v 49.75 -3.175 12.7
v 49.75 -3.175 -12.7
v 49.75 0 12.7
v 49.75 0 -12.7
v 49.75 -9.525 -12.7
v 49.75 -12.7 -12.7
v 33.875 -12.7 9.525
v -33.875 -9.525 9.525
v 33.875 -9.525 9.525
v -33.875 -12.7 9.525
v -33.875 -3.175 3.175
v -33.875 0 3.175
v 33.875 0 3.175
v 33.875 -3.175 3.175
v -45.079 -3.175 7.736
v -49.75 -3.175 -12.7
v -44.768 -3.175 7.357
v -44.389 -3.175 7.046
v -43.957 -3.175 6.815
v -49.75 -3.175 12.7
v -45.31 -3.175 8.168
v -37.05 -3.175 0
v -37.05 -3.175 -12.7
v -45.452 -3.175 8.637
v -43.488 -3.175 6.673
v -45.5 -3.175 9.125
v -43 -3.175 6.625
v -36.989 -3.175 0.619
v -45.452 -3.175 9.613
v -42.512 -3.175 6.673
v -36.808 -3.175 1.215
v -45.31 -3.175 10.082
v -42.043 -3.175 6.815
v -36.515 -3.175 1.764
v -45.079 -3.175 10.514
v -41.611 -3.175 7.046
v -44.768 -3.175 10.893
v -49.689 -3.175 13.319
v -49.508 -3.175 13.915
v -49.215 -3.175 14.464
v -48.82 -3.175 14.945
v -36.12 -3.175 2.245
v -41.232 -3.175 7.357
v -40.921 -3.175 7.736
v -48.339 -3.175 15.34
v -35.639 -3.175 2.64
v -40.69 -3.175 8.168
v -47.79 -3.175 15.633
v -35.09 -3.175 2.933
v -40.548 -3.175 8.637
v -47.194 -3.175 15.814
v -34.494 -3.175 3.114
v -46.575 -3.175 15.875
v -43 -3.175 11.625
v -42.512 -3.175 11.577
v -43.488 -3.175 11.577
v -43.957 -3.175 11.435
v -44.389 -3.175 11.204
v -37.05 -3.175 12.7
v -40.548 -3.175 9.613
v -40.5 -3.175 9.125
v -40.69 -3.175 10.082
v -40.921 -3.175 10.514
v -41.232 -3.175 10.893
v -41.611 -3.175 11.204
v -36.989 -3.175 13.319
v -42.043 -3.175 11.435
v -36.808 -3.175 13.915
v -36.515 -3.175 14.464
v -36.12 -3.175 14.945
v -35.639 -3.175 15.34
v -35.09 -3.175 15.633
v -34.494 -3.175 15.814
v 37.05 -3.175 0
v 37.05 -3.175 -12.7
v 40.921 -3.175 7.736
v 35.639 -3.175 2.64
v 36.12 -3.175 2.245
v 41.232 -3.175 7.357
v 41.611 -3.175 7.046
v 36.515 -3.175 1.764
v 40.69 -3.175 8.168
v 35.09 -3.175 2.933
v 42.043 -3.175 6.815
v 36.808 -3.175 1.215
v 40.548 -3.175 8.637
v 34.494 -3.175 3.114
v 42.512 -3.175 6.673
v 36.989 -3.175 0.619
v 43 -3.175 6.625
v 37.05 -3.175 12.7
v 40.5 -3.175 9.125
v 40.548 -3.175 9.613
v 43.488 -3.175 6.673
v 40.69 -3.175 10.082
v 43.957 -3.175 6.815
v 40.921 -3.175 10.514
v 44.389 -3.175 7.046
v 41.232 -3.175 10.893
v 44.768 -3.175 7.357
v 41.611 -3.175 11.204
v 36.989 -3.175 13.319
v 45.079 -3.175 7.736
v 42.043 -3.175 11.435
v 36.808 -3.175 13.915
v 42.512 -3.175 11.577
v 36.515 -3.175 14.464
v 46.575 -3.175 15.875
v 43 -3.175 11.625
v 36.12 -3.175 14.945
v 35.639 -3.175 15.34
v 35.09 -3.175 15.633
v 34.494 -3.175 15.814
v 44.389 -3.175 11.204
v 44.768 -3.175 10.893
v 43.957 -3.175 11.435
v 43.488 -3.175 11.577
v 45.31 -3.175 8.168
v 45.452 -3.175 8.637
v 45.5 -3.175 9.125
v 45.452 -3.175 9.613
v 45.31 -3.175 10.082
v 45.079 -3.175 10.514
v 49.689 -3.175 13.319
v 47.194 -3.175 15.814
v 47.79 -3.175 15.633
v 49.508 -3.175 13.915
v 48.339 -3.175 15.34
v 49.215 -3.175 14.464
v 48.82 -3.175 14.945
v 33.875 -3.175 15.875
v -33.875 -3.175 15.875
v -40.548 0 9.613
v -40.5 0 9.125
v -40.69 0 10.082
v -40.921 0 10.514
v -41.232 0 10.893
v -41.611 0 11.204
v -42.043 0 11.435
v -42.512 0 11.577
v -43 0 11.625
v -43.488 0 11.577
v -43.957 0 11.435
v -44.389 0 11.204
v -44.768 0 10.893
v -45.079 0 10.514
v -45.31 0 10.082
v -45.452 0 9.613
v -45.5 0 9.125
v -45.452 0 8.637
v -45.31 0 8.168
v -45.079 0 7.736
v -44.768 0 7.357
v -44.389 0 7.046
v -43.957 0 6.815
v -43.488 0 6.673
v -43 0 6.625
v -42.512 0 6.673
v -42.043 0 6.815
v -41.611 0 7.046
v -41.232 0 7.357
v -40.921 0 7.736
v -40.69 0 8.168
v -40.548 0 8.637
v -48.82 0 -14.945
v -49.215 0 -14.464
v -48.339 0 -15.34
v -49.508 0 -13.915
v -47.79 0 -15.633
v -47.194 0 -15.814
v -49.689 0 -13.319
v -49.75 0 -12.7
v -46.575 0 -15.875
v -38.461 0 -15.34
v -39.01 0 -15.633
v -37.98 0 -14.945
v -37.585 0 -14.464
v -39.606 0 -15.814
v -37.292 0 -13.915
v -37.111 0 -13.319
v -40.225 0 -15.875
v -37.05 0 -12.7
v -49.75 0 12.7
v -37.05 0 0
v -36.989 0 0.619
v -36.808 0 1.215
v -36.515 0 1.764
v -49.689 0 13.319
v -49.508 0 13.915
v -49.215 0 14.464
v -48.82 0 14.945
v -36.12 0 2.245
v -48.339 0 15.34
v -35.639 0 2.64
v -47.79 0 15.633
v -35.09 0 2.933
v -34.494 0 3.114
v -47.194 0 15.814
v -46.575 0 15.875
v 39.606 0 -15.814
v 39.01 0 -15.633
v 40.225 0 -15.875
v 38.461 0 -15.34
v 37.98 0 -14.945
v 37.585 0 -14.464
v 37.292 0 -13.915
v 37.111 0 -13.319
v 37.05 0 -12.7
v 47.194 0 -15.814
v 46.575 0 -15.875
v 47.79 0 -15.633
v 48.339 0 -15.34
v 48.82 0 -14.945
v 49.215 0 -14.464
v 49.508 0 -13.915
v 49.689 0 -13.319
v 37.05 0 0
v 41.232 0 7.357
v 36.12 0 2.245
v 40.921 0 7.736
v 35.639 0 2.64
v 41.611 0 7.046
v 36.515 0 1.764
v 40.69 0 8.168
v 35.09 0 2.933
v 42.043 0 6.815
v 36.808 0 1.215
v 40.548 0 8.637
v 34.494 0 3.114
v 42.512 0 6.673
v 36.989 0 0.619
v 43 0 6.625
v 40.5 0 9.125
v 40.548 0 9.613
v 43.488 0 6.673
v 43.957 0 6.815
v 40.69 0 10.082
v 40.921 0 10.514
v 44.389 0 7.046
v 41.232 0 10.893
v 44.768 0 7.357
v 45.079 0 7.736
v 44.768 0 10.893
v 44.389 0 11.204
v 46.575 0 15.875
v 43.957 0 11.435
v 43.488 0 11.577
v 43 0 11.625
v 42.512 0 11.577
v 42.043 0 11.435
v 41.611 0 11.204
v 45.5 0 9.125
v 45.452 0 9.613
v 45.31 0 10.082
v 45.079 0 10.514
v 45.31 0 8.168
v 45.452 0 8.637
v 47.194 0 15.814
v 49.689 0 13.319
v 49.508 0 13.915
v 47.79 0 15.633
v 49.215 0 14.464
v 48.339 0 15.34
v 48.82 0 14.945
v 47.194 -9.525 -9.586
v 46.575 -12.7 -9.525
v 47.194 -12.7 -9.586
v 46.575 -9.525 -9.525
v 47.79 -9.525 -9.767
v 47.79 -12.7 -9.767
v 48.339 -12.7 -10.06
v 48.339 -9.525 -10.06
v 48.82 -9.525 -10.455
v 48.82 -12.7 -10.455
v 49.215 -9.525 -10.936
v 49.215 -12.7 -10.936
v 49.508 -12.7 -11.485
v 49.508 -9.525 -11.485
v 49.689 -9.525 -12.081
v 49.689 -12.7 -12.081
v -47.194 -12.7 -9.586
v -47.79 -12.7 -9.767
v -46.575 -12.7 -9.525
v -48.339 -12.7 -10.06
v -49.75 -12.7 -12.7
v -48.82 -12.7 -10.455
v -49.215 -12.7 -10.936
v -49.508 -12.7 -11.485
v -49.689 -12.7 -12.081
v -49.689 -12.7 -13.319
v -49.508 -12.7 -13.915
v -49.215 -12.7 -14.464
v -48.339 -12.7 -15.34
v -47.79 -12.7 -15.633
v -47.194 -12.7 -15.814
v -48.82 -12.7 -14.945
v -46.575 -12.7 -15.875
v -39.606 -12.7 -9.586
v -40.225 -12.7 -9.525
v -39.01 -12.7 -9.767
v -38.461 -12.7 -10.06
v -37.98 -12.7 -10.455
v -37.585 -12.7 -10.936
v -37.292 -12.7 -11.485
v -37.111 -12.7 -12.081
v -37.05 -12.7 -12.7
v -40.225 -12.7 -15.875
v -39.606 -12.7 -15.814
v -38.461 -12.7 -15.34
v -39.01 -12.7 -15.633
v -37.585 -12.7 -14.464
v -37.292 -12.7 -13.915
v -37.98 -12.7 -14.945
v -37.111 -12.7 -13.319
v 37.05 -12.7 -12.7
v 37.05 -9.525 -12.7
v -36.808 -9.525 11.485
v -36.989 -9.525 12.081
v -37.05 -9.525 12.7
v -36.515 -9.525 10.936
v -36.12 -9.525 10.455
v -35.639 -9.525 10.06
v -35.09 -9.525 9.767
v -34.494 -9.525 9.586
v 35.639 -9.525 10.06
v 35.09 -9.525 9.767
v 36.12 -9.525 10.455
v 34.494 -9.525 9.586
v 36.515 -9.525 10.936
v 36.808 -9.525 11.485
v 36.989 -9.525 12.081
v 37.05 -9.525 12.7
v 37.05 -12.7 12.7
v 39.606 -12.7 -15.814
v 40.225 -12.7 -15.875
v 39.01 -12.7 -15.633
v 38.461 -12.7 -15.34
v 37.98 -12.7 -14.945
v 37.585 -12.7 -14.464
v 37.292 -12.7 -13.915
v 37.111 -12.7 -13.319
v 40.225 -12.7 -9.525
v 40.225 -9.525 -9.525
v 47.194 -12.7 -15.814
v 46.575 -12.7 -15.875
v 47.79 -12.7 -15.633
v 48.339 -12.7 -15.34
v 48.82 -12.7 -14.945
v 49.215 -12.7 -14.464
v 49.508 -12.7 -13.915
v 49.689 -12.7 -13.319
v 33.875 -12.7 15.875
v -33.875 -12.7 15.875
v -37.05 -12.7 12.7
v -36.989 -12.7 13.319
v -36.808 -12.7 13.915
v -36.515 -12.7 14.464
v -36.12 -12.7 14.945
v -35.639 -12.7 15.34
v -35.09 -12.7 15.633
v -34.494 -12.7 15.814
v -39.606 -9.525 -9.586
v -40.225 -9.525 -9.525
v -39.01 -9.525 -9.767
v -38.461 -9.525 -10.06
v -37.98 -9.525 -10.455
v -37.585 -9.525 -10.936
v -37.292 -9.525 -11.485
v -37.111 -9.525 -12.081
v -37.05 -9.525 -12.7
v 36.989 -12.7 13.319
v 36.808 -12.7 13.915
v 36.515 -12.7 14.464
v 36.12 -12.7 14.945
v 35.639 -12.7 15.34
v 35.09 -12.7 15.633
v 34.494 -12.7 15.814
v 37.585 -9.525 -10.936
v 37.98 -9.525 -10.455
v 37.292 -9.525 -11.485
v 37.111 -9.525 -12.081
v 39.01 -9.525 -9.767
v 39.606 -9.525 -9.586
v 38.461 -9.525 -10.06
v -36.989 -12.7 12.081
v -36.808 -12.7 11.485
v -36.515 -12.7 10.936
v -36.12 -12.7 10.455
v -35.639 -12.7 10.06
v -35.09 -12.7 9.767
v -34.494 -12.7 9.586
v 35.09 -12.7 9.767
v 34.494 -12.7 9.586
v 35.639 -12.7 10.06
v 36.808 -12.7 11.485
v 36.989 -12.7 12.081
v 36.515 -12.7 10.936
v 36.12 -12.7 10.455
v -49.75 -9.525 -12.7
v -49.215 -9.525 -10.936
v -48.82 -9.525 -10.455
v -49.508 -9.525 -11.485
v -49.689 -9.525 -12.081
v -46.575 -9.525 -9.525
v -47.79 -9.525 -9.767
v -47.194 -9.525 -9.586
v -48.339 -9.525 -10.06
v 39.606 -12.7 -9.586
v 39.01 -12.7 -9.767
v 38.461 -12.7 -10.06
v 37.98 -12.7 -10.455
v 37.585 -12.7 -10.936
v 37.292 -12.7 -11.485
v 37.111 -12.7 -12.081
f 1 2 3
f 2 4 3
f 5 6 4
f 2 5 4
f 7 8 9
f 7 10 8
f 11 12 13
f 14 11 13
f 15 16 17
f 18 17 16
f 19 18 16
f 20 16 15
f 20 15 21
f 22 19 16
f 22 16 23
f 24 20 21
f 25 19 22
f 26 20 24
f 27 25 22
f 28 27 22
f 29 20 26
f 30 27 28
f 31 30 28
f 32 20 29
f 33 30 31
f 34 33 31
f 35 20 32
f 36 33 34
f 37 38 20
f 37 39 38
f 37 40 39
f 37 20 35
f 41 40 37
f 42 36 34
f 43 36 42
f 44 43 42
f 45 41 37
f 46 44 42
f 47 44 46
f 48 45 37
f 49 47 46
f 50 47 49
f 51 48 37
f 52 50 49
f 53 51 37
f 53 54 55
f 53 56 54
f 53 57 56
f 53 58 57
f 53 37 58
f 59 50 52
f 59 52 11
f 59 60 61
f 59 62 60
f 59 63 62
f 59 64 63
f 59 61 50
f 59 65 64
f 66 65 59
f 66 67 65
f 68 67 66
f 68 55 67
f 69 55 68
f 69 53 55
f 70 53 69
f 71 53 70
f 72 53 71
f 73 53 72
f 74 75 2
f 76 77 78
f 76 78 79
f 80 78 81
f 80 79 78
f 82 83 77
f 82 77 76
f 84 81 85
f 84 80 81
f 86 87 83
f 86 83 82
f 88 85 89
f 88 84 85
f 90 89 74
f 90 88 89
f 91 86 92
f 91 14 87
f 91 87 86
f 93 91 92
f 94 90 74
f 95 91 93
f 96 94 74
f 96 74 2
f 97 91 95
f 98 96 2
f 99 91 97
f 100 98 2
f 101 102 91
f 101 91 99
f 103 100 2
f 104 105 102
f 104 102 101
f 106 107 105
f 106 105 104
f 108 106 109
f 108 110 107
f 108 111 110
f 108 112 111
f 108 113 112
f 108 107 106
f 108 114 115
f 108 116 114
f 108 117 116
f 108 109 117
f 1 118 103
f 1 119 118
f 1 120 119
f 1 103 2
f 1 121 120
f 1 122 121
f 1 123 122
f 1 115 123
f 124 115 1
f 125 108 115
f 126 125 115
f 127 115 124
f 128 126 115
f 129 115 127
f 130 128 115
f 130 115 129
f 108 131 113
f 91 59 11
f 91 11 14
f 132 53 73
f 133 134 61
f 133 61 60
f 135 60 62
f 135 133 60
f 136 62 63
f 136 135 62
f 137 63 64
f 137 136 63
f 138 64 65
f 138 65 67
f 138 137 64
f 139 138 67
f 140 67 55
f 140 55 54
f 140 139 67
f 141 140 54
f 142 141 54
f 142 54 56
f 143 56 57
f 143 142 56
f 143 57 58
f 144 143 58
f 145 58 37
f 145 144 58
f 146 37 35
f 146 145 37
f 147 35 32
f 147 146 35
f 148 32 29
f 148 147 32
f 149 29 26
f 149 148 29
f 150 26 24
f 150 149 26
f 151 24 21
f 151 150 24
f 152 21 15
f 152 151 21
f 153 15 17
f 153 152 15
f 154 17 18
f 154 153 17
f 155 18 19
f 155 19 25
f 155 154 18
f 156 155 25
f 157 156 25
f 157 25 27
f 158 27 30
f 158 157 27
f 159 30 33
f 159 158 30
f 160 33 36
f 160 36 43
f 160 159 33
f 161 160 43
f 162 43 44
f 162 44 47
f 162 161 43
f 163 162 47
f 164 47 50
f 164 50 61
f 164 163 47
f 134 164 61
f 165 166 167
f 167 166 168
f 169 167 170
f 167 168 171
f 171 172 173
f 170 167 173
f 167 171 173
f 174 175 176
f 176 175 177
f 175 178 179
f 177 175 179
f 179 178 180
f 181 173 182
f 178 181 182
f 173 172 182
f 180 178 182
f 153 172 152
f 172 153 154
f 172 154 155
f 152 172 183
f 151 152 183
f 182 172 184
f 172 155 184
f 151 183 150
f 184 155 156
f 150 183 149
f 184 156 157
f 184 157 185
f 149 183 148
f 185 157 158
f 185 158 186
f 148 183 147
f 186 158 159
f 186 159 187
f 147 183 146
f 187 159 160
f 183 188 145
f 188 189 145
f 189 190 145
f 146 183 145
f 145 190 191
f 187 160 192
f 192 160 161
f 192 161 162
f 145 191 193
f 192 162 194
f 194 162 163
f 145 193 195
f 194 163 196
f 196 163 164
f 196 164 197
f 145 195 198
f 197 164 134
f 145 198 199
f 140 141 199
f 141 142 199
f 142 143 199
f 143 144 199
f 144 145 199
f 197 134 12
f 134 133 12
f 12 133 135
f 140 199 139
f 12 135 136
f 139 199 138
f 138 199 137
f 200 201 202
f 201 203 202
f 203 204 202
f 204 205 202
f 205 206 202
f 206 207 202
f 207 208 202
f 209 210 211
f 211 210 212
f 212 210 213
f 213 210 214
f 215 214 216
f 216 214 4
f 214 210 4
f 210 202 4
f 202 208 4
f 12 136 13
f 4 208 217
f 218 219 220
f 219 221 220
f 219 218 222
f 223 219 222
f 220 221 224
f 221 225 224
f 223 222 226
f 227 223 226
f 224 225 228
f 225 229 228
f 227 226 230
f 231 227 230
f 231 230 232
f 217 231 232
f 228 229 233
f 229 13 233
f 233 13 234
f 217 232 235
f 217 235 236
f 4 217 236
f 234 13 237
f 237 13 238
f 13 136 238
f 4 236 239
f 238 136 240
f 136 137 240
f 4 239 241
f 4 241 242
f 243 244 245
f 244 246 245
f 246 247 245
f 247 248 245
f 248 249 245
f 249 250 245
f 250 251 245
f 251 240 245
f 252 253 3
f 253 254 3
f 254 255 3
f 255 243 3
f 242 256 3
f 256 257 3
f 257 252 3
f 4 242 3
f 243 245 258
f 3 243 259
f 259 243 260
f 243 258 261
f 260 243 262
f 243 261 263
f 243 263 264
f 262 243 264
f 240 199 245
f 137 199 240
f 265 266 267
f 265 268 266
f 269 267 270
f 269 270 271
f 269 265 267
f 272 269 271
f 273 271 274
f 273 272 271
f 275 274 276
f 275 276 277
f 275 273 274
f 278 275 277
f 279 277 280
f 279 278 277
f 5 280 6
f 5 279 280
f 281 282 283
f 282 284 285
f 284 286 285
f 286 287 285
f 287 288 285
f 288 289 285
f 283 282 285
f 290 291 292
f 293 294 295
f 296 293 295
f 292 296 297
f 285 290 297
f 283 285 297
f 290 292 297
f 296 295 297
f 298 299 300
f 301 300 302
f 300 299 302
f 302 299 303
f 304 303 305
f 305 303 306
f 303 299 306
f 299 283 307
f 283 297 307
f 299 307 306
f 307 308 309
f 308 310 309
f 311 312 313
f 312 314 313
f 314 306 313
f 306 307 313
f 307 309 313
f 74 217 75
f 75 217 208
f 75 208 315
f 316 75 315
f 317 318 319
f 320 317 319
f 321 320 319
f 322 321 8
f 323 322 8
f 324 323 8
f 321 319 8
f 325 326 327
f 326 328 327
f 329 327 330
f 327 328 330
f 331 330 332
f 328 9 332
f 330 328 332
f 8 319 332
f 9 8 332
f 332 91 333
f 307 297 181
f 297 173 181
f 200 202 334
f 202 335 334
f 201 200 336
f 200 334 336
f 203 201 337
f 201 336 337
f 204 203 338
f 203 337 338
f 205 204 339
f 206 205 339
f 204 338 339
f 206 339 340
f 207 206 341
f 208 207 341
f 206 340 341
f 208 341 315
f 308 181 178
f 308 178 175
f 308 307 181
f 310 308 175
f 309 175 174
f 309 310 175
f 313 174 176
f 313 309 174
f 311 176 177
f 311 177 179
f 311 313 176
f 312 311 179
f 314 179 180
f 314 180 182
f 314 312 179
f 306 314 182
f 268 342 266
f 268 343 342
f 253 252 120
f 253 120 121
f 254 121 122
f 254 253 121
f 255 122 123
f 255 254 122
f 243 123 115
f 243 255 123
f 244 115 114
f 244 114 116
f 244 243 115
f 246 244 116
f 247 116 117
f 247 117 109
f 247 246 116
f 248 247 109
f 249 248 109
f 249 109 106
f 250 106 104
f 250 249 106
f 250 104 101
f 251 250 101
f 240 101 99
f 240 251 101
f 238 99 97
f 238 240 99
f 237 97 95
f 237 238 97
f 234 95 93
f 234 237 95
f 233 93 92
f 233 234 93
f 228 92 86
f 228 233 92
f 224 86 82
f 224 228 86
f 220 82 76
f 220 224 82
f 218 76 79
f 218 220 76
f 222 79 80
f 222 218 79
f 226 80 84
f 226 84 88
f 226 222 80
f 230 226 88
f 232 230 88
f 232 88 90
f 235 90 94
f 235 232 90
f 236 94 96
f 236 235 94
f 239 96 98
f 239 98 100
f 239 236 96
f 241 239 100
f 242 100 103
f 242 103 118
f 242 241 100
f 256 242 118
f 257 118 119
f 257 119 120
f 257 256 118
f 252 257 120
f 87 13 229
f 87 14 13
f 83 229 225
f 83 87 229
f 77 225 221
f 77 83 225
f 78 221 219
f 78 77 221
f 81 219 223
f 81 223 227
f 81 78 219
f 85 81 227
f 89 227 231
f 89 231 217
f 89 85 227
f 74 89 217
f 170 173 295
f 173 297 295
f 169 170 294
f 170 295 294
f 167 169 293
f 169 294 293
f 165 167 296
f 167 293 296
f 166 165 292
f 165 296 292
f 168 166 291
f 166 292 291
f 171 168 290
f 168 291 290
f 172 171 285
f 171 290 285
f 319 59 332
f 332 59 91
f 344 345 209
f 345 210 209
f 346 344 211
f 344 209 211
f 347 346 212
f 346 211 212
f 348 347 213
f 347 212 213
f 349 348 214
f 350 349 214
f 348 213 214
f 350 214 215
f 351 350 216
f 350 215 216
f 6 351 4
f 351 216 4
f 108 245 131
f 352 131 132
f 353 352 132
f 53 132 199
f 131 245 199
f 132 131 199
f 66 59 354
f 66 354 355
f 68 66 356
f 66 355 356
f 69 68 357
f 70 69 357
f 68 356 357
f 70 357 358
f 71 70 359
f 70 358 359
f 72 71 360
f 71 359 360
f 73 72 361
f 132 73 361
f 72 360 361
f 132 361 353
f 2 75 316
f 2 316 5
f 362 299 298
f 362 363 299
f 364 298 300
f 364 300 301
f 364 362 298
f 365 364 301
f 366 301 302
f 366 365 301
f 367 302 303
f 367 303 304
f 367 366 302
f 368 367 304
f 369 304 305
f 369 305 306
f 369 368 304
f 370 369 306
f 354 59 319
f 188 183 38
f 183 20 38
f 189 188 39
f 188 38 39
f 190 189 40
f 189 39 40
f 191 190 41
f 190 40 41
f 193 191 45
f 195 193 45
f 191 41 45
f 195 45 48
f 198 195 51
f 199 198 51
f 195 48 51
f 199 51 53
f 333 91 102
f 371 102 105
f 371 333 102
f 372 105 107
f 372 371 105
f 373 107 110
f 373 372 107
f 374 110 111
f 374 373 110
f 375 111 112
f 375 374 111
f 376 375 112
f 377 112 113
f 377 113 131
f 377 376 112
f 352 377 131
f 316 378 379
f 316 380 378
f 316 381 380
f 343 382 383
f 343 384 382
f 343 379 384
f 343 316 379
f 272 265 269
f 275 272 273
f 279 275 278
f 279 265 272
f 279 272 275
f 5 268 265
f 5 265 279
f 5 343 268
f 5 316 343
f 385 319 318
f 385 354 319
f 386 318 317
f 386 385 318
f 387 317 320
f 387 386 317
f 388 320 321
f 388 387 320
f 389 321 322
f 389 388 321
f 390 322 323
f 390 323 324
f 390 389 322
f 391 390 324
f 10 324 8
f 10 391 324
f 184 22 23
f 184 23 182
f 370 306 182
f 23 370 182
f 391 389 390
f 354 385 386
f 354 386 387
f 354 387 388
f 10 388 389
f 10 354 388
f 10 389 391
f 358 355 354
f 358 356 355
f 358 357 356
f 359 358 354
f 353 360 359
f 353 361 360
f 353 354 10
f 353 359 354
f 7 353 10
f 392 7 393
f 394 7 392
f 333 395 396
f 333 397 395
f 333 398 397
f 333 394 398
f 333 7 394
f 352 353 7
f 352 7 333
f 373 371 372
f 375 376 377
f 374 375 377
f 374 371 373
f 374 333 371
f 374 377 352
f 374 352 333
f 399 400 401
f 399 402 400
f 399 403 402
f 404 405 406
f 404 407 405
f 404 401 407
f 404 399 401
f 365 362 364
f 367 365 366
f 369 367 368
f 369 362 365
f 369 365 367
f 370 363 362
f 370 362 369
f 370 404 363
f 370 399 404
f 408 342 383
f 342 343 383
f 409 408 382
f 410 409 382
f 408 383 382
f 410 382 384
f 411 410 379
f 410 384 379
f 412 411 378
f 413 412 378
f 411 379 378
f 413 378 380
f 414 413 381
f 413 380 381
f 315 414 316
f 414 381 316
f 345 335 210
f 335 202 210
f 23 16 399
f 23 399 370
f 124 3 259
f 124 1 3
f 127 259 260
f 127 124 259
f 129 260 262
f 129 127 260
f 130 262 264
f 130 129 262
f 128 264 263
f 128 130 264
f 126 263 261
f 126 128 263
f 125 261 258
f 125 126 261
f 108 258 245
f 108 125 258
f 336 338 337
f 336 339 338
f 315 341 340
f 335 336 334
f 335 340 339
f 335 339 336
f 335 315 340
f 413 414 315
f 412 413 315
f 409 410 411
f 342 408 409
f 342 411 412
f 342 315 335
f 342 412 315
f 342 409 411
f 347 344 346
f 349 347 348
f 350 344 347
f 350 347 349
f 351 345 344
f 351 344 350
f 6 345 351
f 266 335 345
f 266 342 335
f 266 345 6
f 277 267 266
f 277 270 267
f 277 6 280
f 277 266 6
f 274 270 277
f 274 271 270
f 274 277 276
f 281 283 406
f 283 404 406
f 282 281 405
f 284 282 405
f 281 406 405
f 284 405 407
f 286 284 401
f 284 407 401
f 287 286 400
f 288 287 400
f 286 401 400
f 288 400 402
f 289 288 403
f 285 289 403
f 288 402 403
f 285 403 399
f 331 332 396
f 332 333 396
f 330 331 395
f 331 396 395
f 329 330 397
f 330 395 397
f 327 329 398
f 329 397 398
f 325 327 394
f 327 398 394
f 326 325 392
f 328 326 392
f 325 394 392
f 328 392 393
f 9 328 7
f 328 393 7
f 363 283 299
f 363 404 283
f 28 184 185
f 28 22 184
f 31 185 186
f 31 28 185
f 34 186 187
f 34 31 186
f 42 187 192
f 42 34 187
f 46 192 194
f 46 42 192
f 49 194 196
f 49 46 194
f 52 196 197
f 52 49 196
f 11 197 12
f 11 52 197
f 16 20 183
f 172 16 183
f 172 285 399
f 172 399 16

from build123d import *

# Parameters (mm, degrees)
F0_R     = 2.5
F1_DEPTH = 3.175
F2_W     = 12.7
F2_H     = 3.175
F2_W_2   = 74.1
F3_DEPTH = 9.525
F4_W     = 12.7
F4_H     = 3.175
F5_DEPTH = 3.175
F6_W     = 74.1
F6_H     = 3.175
F7_DEPTH = 3.175
F8_R     = 3.17499


# Not quite as in the source:
# - a fillet or chamfer is up to 0.001 mm smaller than in the source, because OpenCascade refuses the exact size


with BuildPart() as f1:
    # F0 (on Front) → F1 (new body)
    with BuildSketch(Plane.XZ):
        Polygon((49.75, -15.875), (49.75, 15.875), (-49.75, 15.875), (-49.75, -15.875), (-37.05, -15.875), (-37.05, 3.175), (37.05, 3.175), (37.05, -15.875), align=None)
        with Locations((-43, 9.125)):
            Circle(F0_R, mode=Mode.SUBTRACT)
        with Locations((43, 9.125)):
            Circle(F0_R, mode=Mode.SUBTRACT)
    extrude(amount=F1_DEPTH)

    # F2 (on face) → F3 (join)
    with BuildSketch(Plane.XZ.offset(3.175)):
        with Locations((-43.4, -14.2875)):
            Rectangle(F2_W, F2_H)
        with Locations((43.4, -14.2875)):
            Rectangle(F2_W, F2_H)
        with Locations((0, 14.2875)):
            Rectangle(F2_W_2, F2_H)
    extrude(amount=F3_DEPTH)

    # F4 (on face) → F5 (join)
    with BuildSketch(Plane.XY.offset(-12.7)):
        with Locations((-43.4, -11.1125)):
            Rectangle(F4_W, F4_H)
        with Locations((43.4, -11.1125)):
            Rectangle(F4_W, F4_H)
    extrude(amount=F5_DEPTH)

    # F6 (on face) → F7 (join)
    with BuildSketch(Plane(origin=(0, 0, 12.7), x_dir=(1, 0, 0), z_dir=(0, 0, -1))):
        with Locations((0, 11.1125)):
            Rectangle(F6_W, F6_H)
    extrude(amount=F7_DEPTH)

    # F8 (radius 3.175 in the source; OpenCascade refuses exactly that, so slightly less here)
    f8_edges = [f1.edges().sort_by_distance(p)[0] for p in [
        (-49.75, -1.5875, 15.875),
        (-49.75, -6.35, -15.875),
        (-37.05, -6.35, -15.875),
        (49.75, -6.35, -15.875),
        (37.05, -6.35, -15.875),
        (49.75, -1.5875, 15.875),
        (37.05, -1.5875, 3.175),
        (-37.05, -1.5875, 3.175),
        (-49.75, -11.1125, -9.525),
        (-37.05, -11.1125, -9.525),
        (49.75, -11.1125, -9.525),
        (37.05, -11.1125, -9.525),
        (-37.05, -7.9375, 15.875),
        (-37.05, -11.1125, 9.525),
        (37.05, -7.9375, 15.875),
        (37.05, -11.1125, 9.525),
    ]]
    fillet(f8_edges, radius=F8_R)


solid = f1.part
